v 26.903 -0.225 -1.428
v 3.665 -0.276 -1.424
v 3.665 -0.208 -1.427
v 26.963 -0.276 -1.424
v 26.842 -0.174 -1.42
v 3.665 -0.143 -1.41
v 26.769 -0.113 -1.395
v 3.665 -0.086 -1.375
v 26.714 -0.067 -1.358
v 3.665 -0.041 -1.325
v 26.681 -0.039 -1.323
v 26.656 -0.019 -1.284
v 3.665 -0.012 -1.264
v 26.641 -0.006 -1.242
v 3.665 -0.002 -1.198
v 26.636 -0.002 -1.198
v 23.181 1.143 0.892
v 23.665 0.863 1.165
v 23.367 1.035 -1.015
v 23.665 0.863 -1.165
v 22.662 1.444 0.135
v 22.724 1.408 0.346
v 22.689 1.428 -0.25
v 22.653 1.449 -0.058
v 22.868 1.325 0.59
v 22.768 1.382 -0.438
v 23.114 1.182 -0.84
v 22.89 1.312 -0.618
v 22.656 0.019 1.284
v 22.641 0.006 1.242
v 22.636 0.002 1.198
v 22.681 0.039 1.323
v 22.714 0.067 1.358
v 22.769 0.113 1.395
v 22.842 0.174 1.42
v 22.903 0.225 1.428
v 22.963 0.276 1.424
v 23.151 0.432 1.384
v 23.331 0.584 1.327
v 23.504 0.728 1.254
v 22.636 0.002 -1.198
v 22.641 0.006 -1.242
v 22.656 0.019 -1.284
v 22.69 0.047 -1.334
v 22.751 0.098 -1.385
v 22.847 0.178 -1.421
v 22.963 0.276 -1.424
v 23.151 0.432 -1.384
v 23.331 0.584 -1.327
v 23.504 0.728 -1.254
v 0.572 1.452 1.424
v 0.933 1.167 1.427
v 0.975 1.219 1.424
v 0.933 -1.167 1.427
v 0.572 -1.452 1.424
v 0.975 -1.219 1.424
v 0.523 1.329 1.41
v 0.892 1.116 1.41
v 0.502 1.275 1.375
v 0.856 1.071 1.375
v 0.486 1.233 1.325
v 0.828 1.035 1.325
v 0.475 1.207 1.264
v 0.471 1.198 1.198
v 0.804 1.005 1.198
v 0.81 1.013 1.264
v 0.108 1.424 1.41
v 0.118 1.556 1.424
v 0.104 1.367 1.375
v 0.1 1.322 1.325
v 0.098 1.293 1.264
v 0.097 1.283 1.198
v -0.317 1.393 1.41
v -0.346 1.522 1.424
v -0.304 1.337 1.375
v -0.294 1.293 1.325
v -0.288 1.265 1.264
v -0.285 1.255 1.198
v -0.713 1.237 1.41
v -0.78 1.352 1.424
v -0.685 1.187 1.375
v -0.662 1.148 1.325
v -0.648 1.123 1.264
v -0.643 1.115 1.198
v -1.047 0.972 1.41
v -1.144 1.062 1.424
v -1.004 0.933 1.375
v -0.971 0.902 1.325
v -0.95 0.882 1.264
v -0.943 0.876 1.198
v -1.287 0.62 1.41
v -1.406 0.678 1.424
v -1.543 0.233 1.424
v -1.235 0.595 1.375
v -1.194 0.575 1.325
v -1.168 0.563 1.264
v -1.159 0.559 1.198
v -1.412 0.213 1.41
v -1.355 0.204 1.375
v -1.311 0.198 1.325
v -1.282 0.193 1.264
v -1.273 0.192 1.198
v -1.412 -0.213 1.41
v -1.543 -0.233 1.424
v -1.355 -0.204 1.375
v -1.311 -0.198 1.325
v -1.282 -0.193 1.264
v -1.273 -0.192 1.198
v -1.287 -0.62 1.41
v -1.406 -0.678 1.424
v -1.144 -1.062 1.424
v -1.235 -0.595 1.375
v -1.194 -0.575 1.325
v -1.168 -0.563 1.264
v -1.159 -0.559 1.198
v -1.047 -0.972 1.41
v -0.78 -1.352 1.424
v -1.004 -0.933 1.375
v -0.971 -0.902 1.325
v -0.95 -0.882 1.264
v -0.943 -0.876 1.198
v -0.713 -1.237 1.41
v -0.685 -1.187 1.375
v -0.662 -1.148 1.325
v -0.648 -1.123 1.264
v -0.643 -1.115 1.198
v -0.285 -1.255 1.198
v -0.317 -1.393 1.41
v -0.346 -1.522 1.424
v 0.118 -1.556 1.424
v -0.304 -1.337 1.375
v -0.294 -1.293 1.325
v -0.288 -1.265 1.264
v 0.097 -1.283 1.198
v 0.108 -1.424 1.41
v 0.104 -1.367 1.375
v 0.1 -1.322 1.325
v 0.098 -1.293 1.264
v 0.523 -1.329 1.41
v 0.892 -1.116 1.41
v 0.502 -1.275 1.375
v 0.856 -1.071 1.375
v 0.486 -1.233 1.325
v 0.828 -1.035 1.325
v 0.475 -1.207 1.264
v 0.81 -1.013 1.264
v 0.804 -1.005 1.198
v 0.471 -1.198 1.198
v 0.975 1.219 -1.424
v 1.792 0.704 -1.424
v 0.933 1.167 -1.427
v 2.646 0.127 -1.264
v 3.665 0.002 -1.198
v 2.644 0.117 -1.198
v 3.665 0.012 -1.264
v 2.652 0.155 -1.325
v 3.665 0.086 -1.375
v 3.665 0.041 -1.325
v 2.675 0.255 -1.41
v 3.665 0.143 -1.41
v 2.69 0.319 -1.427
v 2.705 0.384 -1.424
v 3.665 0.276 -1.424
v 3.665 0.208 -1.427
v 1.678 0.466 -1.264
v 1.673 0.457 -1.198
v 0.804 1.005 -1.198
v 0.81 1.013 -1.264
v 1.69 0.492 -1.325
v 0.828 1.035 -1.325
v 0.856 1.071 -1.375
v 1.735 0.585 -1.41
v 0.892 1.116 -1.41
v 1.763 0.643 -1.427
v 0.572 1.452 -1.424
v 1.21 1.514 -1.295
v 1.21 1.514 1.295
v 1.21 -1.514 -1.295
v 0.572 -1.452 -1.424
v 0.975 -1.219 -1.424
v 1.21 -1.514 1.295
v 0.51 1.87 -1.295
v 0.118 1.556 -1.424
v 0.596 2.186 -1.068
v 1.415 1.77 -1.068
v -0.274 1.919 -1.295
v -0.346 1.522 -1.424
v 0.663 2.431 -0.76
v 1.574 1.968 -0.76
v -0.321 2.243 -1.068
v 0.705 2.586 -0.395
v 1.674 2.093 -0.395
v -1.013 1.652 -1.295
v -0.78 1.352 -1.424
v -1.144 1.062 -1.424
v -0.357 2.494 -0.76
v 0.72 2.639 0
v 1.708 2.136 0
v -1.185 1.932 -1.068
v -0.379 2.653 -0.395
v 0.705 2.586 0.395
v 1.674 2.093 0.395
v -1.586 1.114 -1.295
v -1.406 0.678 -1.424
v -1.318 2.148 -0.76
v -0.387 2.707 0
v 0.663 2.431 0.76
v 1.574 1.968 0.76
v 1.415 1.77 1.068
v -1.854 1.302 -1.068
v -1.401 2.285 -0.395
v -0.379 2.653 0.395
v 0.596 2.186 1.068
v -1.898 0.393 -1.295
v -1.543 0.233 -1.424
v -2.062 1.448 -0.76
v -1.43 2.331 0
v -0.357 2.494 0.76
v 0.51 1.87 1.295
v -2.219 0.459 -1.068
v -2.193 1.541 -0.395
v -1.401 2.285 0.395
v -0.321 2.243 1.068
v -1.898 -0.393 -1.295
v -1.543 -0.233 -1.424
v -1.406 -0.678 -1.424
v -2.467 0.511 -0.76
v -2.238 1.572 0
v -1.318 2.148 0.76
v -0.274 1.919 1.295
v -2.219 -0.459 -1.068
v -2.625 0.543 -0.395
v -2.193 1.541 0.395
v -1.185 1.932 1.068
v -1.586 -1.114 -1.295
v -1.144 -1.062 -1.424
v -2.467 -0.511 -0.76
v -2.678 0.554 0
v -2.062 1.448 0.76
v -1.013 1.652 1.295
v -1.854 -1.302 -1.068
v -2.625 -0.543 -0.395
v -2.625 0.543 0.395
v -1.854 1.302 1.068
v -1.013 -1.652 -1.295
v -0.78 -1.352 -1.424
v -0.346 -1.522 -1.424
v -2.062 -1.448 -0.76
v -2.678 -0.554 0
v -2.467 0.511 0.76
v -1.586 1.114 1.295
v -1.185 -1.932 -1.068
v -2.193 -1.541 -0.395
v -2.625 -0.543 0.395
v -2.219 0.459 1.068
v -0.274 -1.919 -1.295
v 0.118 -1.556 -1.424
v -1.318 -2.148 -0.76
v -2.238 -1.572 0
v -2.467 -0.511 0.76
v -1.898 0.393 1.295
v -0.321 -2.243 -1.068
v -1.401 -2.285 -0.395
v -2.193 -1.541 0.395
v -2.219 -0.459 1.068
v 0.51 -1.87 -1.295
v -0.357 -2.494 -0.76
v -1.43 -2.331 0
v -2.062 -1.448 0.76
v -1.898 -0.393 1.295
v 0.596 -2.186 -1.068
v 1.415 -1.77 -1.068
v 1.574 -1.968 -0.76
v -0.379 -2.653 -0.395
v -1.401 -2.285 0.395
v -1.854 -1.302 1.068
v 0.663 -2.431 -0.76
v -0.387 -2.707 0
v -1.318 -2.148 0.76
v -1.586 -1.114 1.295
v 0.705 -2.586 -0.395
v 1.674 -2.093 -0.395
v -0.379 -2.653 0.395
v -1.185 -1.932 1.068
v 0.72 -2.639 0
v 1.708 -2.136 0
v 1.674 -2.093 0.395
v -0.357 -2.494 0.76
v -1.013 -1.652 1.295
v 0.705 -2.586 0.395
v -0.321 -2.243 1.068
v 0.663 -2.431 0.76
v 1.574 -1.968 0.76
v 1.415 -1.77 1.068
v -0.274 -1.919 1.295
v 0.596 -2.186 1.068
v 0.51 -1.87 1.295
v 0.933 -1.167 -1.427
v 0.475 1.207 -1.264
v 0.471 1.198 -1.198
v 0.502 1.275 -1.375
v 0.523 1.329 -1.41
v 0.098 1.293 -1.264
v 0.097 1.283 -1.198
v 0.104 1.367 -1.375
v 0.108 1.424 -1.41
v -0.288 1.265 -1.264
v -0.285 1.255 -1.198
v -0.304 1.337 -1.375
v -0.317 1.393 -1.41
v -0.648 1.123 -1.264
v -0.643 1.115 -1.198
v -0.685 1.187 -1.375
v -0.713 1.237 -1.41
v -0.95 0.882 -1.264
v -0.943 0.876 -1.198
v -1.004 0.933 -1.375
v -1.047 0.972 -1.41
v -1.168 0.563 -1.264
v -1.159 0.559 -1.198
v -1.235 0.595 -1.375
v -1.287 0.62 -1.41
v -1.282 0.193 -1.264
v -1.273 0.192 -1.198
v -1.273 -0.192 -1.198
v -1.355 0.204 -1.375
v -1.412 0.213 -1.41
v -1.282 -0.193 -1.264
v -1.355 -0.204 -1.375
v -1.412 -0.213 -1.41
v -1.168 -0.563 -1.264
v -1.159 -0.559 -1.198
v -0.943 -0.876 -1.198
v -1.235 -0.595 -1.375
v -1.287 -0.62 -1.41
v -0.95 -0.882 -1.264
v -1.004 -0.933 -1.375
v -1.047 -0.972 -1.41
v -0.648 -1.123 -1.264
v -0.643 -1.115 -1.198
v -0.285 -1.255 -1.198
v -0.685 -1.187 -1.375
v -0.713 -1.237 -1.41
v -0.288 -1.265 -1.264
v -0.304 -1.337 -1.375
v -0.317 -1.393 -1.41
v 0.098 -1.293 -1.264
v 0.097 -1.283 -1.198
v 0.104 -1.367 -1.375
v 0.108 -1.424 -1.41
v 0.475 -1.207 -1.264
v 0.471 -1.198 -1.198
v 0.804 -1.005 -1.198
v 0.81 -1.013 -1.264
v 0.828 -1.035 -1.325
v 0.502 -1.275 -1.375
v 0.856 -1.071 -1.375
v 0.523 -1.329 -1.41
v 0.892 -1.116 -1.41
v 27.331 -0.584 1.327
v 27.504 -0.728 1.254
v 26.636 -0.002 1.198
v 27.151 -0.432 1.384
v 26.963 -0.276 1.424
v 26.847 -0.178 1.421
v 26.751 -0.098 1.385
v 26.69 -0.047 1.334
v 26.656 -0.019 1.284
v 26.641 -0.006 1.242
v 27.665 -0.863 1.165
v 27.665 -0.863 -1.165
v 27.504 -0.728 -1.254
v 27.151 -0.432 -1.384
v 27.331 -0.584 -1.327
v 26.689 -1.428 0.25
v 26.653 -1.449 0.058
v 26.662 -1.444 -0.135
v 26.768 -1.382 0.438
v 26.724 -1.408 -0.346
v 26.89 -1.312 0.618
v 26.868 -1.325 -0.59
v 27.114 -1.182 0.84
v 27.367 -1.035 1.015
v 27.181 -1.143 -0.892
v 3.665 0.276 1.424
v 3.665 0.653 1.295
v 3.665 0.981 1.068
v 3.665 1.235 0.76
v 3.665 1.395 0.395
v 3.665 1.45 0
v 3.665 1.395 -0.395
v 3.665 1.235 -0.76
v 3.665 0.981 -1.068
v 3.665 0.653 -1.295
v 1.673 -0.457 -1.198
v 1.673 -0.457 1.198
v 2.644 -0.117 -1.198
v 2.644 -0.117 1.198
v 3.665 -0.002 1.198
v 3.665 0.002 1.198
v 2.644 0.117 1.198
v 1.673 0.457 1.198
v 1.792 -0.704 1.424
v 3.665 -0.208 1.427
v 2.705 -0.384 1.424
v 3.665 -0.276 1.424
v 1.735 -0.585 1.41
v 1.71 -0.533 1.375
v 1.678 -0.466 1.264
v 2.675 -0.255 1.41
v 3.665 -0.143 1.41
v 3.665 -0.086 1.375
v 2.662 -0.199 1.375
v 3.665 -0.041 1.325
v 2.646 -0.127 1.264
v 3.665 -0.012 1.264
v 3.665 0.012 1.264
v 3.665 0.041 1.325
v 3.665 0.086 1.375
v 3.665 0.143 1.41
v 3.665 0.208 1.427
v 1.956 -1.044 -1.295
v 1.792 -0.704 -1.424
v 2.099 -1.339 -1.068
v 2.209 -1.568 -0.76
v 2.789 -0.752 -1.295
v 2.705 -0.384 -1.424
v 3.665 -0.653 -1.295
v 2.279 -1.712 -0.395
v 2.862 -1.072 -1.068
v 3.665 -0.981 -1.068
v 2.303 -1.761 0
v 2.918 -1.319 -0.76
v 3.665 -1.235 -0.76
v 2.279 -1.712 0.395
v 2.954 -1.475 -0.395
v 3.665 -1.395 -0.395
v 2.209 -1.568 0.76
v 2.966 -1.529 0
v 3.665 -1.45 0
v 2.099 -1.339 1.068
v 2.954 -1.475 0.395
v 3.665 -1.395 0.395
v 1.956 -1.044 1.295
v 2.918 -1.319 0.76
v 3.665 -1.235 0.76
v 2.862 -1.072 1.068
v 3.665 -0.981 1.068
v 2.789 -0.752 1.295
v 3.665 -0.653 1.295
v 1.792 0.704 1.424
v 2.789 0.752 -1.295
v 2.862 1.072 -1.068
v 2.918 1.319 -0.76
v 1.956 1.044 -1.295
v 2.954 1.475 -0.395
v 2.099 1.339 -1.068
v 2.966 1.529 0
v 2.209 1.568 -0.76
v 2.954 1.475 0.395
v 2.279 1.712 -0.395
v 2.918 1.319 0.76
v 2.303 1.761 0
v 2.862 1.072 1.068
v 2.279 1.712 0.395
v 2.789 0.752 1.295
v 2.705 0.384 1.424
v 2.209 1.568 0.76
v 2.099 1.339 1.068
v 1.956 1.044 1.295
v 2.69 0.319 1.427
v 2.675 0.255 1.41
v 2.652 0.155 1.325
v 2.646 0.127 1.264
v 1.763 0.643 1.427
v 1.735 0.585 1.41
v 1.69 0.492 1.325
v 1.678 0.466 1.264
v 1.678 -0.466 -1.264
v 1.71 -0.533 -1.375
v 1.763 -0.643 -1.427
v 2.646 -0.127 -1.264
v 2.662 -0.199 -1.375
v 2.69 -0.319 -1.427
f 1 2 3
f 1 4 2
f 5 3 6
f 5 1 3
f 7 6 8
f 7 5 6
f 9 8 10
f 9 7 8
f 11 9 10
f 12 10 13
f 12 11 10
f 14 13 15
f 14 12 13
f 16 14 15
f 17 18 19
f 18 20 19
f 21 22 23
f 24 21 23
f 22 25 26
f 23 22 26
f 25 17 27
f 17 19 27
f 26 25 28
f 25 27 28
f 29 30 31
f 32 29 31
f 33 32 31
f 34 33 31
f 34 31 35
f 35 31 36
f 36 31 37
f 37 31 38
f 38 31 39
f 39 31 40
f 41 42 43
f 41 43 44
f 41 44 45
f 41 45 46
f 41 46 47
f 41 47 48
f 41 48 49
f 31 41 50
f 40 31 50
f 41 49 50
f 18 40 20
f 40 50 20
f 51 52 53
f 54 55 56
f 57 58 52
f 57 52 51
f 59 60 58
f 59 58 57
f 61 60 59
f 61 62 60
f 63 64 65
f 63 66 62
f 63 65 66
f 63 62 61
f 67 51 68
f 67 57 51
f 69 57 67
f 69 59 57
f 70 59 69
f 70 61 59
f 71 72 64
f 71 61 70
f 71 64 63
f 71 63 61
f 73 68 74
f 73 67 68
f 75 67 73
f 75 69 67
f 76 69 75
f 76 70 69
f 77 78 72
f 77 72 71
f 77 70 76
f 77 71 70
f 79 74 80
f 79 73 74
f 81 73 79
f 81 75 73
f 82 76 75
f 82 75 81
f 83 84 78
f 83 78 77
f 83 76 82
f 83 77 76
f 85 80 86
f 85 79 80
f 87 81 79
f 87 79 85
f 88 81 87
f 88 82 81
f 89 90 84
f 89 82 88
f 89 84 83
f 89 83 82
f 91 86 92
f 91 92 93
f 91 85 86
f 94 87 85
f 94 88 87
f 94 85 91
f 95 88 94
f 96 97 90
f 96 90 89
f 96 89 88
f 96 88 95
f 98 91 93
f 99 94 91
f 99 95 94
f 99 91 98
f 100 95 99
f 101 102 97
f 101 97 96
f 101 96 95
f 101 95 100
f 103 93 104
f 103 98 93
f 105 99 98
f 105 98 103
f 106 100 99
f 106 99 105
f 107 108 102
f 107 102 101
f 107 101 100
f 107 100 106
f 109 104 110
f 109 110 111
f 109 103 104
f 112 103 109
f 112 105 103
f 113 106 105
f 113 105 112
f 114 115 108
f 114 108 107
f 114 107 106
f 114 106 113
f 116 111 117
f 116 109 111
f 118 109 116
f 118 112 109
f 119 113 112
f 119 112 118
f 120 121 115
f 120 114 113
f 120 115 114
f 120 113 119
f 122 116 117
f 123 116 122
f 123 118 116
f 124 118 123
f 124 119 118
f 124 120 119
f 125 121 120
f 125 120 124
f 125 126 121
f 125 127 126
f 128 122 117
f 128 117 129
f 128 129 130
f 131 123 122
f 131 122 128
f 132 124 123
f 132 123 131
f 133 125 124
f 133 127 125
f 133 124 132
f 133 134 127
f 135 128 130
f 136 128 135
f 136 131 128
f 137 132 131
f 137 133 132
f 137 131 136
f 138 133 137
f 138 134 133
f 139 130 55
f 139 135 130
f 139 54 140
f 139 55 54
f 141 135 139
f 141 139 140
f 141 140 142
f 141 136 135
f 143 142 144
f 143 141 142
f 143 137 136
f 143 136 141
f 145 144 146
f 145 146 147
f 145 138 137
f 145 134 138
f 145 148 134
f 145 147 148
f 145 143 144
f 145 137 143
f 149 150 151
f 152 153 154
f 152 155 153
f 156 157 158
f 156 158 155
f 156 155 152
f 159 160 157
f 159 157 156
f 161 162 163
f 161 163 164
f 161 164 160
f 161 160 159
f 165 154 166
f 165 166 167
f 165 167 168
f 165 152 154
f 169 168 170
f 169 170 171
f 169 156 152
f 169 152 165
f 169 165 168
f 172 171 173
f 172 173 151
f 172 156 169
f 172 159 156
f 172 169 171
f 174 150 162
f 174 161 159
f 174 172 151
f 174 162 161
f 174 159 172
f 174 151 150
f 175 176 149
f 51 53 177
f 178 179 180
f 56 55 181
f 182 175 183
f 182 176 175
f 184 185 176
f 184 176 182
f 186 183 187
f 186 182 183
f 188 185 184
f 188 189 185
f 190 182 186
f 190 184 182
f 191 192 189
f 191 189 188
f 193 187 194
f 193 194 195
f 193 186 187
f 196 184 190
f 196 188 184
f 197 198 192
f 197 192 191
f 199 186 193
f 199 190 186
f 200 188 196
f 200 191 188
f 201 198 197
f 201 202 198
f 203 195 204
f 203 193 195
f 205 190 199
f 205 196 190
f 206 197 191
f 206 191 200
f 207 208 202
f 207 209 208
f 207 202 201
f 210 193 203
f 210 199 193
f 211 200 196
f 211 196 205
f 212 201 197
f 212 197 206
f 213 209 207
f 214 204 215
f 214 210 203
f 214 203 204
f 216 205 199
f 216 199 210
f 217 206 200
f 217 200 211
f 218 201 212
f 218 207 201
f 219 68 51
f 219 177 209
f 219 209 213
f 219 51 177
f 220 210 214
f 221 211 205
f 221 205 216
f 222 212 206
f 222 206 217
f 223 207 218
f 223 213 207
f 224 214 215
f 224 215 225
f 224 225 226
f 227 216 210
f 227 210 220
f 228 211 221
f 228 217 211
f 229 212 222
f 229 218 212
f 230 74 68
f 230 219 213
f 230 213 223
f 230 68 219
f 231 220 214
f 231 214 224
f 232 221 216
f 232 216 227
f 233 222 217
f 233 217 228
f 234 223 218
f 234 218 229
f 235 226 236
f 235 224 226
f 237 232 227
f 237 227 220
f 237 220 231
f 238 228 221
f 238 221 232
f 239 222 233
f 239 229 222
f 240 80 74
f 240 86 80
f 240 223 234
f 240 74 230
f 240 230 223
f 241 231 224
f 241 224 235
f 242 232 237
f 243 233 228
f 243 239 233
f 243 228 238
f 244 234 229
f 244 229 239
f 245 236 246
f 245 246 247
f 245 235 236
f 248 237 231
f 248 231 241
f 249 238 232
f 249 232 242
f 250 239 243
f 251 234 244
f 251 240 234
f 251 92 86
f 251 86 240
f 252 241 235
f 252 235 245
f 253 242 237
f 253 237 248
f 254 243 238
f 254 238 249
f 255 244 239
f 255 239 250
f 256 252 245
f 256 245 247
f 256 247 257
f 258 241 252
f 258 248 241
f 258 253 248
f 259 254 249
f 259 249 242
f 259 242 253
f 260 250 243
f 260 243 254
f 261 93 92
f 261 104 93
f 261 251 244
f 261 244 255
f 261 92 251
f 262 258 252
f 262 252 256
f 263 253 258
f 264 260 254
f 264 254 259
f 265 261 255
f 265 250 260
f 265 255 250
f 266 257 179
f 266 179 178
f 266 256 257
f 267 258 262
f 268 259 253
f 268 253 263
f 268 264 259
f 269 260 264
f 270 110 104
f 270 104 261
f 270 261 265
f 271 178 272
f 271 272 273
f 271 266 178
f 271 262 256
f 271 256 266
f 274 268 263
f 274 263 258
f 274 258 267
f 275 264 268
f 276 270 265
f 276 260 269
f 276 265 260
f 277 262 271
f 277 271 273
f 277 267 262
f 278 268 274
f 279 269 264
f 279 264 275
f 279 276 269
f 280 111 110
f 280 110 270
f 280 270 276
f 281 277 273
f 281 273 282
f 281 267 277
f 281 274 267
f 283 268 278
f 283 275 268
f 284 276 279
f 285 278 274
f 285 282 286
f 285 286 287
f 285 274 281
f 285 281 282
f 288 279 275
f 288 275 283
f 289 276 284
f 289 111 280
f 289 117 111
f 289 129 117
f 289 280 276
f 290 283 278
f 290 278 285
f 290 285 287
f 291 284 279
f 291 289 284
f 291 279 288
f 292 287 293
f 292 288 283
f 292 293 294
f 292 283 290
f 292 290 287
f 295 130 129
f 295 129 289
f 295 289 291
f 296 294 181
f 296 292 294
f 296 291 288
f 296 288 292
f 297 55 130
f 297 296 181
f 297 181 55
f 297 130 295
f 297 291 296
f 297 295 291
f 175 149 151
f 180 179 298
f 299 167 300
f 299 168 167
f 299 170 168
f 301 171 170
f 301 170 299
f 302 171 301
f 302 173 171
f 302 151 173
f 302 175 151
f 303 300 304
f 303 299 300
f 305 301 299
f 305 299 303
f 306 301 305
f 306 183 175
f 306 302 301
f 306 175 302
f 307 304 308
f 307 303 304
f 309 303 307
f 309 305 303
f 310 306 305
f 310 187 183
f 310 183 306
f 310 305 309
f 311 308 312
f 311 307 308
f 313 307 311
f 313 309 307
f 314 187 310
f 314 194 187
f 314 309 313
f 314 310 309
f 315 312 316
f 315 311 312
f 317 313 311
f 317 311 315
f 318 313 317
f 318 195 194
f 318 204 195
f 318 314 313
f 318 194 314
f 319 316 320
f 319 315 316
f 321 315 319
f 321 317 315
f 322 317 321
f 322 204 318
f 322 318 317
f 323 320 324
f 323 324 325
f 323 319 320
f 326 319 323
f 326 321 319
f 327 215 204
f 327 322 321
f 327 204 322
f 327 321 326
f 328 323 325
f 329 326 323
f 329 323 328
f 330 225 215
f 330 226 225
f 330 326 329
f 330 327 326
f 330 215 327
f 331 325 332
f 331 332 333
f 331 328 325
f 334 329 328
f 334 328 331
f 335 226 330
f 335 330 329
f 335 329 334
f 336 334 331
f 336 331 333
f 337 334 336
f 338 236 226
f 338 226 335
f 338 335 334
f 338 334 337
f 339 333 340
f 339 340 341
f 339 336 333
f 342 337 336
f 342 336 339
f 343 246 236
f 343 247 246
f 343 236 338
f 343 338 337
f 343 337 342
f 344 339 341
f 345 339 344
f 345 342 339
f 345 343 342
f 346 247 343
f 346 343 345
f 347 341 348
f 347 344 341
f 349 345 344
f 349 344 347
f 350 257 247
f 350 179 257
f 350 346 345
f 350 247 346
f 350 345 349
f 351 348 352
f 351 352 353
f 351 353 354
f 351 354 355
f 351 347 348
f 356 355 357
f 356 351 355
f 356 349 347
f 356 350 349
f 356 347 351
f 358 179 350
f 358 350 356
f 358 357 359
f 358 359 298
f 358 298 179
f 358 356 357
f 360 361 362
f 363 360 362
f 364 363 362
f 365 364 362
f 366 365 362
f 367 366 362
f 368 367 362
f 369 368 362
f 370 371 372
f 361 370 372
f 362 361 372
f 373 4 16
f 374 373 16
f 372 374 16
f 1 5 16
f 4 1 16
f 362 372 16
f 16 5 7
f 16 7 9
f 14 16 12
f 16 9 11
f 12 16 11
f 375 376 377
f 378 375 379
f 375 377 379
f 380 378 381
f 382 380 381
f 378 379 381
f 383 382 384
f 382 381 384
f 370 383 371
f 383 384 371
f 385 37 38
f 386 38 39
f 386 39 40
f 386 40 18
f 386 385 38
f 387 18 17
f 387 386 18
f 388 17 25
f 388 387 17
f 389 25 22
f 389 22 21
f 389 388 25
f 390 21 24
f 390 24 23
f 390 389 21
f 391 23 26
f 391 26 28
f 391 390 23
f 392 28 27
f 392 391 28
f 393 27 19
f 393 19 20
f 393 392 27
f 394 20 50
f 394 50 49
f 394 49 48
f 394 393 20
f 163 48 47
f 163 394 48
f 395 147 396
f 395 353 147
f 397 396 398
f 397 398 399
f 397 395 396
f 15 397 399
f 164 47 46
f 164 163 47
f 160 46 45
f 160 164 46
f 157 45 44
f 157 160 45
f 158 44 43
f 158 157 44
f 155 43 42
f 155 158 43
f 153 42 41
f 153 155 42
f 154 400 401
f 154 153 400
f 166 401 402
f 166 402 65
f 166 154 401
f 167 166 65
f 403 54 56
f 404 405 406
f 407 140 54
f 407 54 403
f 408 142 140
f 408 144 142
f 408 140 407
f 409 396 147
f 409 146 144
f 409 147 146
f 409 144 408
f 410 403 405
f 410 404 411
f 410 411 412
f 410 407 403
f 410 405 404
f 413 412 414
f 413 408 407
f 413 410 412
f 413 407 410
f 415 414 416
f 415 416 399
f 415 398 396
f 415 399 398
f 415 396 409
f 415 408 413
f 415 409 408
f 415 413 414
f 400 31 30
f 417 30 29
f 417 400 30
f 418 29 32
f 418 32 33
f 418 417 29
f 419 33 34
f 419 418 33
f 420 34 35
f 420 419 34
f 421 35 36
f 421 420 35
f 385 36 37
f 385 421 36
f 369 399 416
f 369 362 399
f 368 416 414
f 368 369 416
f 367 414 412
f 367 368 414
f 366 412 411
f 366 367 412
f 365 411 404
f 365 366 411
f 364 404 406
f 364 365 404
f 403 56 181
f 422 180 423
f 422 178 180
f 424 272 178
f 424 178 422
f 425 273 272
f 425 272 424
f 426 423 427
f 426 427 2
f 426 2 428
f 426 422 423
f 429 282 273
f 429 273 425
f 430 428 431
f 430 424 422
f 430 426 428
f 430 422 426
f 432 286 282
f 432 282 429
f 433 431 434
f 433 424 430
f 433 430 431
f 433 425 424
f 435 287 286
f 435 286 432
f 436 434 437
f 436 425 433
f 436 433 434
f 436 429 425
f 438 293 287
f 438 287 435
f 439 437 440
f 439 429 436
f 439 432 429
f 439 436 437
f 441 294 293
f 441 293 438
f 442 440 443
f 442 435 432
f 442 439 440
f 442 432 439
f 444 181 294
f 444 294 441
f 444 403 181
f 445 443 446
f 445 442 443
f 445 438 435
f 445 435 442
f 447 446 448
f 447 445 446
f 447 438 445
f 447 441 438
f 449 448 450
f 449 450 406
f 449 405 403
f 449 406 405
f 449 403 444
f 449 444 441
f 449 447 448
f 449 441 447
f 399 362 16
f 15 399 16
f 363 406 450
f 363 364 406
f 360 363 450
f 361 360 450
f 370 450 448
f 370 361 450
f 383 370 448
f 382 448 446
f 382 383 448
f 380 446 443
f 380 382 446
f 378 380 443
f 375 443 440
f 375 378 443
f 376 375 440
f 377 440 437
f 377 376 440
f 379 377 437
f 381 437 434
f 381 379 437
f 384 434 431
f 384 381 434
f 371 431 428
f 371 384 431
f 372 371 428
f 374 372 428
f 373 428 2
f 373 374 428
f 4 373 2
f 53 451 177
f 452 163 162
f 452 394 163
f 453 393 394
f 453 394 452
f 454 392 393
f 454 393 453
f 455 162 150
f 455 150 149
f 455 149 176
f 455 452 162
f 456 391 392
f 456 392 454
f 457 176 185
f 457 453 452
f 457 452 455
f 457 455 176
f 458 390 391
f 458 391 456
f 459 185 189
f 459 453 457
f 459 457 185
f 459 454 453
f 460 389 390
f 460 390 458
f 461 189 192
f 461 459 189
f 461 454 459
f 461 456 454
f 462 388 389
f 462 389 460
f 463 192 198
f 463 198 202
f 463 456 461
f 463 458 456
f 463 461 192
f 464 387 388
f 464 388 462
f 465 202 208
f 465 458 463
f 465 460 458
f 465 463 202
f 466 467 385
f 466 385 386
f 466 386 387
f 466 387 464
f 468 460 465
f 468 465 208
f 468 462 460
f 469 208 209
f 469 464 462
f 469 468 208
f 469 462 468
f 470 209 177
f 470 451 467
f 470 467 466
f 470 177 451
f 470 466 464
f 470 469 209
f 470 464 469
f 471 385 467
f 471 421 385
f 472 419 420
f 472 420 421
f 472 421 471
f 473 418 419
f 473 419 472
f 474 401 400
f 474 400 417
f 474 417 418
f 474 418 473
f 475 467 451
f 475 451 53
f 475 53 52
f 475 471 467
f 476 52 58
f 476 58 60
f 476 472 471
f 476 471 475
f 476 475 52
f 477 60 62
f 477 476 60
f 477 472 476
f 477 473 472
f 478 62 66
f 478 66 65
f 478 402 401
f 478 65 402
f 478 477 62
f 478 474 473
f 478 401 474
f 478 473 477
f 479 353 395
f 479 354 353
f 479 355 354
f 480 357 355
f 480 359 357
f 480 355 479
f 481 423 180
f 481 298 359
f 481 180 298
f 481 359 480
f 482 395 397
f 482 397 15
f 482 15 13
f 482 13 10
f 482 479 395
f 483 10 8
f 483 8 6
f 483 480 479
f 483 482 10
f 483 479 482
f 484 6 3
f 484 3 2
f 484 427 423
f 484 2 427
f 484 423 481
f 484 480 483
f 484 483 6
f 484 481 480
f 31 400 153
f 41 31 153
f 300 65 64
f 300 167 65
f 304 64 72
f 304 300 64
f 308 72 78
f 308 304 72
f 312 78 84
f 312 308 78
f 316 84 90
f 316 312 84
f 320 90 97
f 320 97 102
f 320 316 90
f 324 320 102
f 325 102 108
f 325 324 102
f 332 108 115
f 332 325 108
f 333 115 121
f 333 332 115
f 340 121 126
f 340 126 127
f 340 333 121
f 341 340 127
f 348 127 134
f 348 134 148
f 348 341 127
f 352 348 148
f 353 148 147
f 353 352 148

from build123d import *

# Parameters (mm, degrees)
CONECUT_DEPTH      = 28.836502766
CONECUT_DEPTH_BACK = 28.836502766


with BuildPart() as part:
    # BaseBody: sweep along a path in PathSke
    with BuildLine(Plane.XY) as basebody_path:
        Line((23.665, 1.45), (3.665, 1.45))
        ThreePointArc((3.665, 1.45), (2.628048973, 1.626517109), (1.707905138, 2.136184692))
        ThreePointArc((1.707905138, 2.136184692), (-2.735, 0), (1.707905138, -2.136184692))
        ThreePointArc((1.707905138, -2.136184692), (2.628048973, -1.626517109), (3.665, -1.45))
        Line((3.665, -1.45), (27.665, -1.45))
    # SectionSke → BaseBody (sweep)
    with BuildSketch(Plane(origin=(23.665, 1.45, 0), x_dir=(0, 0, -1), z_dir=(1, 0, 0))):
        with BuildLine():
            Line((-1.197737868, -1.448), (1.197737868, -1.448))
            ThreePointArc((1.197737868, -1.448), (1.375163447, -1.364356291), (1.423540908, -1.174262295))
            ThreePointArc((1.423540908, -1.174262295), (0, 0), (-1.423540908, -1.174262295))
            ThreePointArc((-1.423540908, -1.174262295), (-1.375163447, -1.364356291), (-1.197737868, -1.448))
        make_face()
    sweep(path=basebody_path.line)

    # ConeCutSke → ConeCut (cut, two sides: drawn at the far end of the back side and taken through both)
    with BuildSketch(Plane.XY.offset(-CONECUT_DEPTH_BACK)):
        Polygon((22.633898934, 1.46), (27.675, 1.46), (27.675, -1.46), (26.633898934, -1.46), (27.665, -0.862868852), (26.633898934, 0), (22.633898934, 0), (23.665, 0.862868852), align=None)
    extrude(amount=CONECUT_DEPTH + CONECUT_DEPTH_BACK, mode=Mode.SUBTRACT)


solid = part.part
